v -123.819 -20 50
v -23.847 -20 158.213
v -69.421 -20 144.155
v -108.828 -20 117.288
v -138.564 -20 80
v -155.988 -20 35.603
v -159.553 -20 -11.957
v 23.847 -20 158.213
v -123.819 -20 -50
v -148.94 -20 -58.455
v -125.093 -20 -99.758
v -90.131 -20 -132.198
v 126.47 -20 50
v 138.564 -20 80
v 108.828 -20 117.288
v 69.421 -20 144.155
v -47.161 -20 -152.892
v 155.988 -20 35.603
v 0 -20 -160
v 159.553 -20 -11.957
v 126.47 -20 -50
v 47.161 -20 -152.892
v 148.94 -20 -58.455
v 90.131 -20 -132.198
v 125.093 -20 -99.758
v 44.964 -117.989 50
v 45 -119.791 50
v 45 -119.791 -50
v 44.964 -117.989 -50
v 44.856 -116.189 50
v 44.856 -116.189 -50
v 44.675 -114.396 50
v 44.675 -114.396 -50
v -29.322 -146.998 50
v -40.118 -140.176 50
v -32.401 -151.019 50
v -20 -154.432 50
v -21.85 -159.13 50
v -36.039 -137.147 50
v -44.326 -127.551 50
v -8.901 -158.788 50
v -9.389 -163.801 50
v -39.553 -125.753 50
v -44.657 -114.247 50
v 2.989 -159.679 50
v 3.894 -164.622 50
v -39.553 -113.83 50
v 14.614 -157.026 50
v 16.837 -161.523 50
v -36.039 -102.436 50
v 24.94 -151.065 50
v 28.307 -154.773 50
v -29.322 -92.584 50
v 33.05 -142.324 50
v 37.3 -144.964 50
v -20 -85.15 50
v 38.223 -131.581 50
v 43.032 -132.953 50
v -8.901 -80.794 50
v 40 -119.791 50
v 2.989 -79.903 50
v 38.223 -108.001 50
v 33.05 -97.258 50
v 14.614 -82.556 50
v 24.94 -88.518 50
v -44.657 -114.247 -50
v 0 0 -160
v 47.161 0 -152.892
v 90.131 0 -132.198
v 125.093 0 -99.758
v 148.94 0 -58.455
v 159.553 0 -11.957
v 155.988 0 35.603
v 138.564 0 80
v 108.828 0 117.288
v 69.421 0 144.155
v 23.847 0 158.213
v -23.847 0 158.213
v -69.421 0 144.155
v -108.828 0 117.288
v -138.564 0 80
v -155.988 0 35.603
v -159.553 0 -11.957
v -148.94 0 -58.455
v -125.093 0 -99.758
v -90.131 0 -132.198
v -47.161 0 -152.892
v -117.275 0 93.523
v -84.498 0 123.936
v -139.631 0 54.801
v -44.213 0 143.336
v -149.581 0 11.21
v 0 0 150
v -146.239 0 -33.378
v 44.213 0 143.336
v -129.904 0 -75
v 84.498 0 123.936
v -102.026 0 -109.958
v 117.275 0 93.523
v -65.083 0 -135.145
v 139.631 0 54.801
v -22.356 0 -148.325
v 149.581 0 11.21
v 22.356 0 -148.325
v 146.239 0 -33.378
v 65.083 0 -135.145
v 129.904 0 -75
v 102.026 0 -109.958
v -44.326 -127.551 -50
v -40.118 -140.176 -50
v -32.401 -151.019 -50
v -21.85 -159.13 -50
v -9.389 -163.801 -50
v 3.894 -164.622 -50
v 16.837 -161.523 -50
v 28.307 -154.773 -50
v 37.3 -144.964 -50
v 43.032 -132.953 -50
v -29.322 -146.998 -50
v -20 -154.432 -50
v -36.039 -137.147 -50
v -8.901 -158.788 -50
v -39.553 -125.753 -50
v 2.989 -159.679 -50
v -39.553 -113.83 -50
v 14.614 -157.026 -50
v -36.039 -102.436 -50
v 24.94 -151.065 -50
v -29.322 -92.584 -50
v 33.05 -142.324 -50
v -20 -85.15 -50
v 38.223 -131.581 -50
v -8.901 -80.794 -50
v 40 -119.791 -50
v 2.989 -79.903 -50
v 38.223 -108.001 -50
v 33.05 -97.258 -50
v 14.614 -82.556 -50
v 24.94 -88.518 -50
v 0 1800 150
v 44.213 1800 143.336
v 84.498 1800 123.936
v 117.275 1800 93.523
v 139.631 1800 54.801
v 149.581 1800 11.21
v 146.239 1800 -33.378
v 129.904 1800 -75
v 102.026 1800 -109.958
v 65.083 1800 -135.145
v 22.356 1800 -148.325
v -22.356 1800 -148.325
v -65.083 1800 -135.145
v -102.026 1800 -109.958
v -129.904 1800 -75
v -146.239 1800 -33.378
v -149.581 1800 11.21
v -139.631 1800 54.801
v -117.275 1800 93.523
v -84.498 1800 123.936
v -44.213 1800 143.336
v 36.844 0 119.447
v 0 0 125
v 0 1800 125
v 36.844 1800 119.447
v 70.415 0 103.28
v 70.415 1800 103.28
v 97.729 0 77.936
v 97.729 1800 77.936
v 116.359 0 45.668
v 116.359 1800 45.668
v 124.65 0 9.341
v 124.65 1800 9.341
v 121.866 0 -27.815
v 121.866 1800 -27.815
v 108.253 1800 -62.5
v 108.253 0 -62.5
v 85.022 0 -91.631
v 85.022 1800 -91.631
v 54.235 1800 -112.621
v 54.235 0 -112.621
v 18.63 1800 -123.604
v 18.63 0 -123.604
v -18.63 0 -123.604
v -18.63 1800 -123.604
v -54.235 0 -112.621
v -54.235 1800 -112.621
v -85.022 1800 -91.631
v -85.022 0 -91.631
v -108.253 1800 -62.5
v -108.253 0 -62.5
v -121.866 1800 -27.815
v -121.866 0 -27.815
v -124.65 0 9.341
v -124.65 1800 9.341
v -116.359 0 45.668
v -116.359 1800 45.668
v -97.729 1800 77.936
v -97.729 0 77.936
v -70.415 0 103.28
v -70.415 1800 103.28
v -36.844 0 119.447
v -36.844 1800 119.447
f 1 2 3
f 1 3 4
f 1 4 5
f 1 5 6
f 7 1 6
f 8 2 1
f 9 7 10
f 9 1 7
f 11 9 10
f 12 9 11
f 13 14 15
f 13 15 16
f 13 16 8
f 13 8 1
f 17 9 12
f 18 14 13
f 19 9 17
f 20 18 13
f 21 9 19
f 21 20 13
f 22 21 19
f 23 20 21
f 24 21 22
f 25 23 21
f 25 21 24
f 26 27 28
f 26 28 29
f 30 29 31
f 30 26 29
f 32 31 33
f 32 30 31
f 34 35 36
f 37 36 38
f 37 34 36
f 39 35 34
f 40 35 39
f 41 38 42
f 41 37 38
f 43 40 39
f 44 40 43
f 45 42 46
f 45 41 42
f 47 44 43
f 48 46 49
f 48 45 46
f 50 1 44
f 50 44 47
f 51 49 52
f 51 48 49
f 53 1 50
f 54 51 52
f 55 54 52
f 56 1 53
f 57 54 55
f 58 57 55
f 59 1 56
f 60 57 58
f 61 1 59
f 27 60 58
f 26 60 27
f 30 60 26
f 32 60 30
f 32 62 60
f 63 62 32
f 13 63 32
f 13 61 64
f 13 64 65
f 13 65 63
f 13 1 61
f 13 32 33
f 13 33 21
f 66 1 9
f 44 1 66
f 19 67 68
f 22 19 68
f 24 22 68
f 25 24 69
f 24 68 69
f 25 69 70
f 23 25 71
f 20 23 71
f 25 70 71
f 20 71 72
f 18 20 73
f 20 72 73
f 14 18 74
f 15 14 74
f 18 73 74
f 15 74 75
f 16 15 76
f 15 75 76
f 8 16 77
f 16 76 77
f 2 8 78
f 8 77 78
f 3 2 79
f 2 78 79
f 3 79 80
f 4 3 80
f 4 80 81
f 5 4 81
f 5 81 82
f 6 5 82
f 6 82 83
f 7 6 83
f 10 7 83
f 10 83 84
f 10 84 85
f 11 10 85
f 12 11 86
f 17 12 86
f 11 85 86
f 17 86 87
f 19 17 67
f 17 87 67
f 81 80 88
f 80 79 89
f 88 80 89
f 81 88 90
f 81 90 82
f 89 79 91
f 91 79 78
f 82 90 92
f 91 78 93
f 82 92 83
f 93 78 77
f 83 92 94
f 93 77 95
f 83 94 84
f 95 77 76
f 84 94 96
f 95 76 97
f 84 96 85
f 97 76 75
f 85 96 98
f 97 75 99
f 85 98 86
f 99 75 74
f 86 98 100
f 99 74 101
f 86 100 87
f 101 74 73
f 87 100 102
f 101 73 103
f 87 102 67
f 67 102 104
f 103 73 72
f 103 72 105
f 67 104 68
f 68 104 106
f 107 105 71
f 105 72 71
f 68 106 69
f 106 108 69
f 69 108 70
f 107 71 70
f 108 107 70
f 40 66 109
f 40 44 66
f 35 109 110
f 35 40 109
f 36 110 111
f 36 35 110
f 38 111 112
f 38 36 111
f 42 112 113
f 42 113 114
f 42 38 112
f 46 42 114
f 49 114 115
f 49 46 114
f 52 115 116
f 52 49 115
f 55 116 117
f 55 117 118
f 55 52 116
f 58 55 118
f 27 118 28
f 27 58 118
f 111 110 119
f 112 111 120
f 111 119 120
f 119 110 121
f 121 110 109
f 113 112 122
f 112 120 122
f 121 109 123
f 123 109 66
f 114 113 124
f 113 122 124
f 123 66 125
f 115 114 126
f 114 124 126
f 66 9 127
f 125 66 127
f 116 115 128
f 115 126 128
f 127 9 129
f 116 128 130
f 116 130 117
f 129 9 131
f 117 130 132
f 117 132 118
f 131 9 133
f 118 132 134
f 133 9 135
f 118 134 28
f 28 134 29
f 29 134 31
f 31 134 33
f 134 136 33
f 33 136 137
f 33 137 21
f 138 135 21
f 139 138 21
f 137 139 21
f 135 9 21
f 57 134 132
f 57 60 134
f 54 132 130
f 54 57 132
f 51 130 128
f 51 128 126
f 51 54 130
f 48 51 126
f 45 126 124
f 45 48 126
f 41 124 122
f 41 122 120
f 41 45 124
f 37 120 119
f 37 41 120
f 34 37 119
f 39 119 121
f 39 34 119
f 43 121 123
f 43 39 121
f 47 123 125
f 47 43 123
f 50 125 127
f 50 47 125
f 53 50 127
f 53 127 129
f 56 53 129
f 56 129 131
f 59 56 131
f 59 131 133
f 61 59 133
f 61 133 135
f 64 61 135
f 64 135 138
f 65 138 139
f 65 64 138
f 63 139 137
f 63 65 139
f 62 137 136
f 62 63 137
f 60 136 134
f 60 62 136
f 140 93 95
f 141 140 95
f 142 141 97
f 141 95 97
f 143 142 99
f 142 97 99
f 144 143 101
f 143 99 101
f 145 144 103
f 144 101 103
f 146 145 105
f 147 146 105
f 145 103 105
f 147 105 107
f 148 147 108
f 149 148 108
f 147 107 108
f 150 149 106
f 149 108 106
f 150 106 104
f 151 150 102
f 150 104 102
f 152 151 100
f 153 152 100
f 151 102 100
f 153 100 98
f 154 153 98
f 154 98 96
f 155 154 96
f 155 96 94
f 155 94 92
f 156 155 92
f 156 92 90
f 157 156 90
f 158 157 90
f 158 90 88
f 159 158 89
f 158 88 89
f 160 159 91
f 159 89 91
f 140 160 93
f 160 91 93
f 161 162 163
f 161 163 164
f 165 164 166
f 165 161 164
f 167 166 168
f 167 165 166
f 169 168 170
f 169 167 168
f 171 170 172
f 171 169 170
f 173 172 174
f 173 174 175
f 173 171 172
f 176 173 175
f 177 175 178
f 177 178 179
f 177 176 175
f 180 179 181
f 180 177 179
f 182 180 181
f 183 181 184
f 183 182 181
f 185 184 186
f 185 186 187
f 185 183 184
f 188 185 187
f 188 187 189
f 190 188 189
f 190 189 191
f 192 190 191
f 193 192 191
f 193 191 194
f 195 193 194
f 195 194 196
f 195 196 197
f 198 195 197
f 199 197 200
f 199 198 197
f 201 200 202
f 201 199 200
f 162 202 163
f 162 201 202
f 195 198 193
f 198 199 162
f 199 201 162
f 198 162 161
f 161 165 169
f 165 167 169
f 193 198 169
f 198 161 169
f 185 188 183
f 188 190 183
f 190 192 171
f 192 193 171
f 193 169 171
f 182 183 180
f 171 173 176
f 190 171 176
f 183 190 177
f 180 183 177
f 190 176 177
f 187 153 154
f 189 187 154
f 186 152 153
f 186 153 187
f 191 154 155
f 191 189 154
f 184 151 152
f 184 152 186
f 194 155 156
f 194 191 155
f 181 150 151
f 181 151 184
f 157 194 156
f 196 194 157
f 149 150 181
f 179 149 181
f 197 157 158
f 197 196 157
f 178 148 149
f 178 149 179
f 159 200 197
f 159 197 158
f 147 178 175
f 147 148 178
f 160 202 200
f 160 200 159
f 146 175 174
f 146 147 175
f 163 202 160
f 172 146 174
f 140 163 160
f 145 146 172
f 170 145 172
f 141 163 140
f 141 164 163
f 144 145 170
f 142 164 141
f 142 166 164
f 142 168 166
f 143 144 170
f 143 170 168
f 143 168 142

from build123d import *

# Parameters (mm, degrees)
SKETCH1_R           = 150
SKETCH1_R_2         = 125
BOSS_EXTRUDE1_DEPTH = 1800
SKETCH2_R           = 160
BOSS_EXTRUDE2_DEPTH = 20
BOSS_EXTRUDE3_DEPTH = 50


with BuildPart() as part:
    # Sketch1 → Boss-Extrude1 (new body)
    with BuildSketch(Plane(origin=(0, 0, 0), x_dir=(1, 0, 0), z_dir=(0, 1, 0))):
        with Locations(Location((0, 0, 0), (0, 0, 270))):
            Circle(SKETCH1_R)
        with Locations(Location((0, 0, 0), (0, 0, 270))):
            Circle(SKETCH1_R_2, mode=Mode.SUBTRACT)
    extrude(amount=BOSS_EXTRUDE1_DEPTH)

    # Sketch2 → Boss-Extrude2 (add)
    with BuildSketch(Plane.XZ):
        with Locations(Location((0, 0, 0), (0, 0, 270))):
            Circle(SKETCH2_R)
    extrude(amount=BOSS_EXTRUDE2_DEPTH)

    # Sketch4 → Boss-Extrude3 (add, symmetric)
    with BuildSketch(Plane.XY):
        with BuildLine():
            ThreePointArc((40, -119.791280473), (0, -159.791280473), (-40, -119.791280473))
            Line((-40, -119.791280473), (-44.657114197, -114.246719929))
            ThreePointArc((-44.657114197, -114.246719929), (-2.777576385, -164.70547722), (45, -119.791280473))
            ThreePointArc((45, -119.791280473), (44.918765065, -117.088588293), (44.675353555, -114.395654025))
            Line((44.675353555, -114.395654025), (40, -119.791280473))
        make_face()
        with BuildLine():
            Line((-44.657114197, -114.246719929), (-40, -119.791280473))
            ThreePointArc((-40, -119.791280473), (0, -79.791280473), (40, -119.791280473))
            Line((40, -119.791280473), (44.675353555, -114.395654025))
            ThreePointArc((44.675353555, -114.395654025), (0.075023395, -74.791343012), (-44.657114197, -114.246719929))
        make_face()
        with BuildLine():
            Line((-123.818976335, -20), (-44.657114197, -114.246719929))
            ThreePointArc((-44.657114197, -114.246719929), (0.075023395, -74.791343012), (44.675353555, -114.395654025))
            Line((44.675353555, -114.395654025), (126.469944209, -20))
            Line((126.469944209, -20), (-123.818976335, -20))
        make_face()
    extrude(amount=BOSS_EXTRUDE3_DEPTH, both=True)


solid = part.part
